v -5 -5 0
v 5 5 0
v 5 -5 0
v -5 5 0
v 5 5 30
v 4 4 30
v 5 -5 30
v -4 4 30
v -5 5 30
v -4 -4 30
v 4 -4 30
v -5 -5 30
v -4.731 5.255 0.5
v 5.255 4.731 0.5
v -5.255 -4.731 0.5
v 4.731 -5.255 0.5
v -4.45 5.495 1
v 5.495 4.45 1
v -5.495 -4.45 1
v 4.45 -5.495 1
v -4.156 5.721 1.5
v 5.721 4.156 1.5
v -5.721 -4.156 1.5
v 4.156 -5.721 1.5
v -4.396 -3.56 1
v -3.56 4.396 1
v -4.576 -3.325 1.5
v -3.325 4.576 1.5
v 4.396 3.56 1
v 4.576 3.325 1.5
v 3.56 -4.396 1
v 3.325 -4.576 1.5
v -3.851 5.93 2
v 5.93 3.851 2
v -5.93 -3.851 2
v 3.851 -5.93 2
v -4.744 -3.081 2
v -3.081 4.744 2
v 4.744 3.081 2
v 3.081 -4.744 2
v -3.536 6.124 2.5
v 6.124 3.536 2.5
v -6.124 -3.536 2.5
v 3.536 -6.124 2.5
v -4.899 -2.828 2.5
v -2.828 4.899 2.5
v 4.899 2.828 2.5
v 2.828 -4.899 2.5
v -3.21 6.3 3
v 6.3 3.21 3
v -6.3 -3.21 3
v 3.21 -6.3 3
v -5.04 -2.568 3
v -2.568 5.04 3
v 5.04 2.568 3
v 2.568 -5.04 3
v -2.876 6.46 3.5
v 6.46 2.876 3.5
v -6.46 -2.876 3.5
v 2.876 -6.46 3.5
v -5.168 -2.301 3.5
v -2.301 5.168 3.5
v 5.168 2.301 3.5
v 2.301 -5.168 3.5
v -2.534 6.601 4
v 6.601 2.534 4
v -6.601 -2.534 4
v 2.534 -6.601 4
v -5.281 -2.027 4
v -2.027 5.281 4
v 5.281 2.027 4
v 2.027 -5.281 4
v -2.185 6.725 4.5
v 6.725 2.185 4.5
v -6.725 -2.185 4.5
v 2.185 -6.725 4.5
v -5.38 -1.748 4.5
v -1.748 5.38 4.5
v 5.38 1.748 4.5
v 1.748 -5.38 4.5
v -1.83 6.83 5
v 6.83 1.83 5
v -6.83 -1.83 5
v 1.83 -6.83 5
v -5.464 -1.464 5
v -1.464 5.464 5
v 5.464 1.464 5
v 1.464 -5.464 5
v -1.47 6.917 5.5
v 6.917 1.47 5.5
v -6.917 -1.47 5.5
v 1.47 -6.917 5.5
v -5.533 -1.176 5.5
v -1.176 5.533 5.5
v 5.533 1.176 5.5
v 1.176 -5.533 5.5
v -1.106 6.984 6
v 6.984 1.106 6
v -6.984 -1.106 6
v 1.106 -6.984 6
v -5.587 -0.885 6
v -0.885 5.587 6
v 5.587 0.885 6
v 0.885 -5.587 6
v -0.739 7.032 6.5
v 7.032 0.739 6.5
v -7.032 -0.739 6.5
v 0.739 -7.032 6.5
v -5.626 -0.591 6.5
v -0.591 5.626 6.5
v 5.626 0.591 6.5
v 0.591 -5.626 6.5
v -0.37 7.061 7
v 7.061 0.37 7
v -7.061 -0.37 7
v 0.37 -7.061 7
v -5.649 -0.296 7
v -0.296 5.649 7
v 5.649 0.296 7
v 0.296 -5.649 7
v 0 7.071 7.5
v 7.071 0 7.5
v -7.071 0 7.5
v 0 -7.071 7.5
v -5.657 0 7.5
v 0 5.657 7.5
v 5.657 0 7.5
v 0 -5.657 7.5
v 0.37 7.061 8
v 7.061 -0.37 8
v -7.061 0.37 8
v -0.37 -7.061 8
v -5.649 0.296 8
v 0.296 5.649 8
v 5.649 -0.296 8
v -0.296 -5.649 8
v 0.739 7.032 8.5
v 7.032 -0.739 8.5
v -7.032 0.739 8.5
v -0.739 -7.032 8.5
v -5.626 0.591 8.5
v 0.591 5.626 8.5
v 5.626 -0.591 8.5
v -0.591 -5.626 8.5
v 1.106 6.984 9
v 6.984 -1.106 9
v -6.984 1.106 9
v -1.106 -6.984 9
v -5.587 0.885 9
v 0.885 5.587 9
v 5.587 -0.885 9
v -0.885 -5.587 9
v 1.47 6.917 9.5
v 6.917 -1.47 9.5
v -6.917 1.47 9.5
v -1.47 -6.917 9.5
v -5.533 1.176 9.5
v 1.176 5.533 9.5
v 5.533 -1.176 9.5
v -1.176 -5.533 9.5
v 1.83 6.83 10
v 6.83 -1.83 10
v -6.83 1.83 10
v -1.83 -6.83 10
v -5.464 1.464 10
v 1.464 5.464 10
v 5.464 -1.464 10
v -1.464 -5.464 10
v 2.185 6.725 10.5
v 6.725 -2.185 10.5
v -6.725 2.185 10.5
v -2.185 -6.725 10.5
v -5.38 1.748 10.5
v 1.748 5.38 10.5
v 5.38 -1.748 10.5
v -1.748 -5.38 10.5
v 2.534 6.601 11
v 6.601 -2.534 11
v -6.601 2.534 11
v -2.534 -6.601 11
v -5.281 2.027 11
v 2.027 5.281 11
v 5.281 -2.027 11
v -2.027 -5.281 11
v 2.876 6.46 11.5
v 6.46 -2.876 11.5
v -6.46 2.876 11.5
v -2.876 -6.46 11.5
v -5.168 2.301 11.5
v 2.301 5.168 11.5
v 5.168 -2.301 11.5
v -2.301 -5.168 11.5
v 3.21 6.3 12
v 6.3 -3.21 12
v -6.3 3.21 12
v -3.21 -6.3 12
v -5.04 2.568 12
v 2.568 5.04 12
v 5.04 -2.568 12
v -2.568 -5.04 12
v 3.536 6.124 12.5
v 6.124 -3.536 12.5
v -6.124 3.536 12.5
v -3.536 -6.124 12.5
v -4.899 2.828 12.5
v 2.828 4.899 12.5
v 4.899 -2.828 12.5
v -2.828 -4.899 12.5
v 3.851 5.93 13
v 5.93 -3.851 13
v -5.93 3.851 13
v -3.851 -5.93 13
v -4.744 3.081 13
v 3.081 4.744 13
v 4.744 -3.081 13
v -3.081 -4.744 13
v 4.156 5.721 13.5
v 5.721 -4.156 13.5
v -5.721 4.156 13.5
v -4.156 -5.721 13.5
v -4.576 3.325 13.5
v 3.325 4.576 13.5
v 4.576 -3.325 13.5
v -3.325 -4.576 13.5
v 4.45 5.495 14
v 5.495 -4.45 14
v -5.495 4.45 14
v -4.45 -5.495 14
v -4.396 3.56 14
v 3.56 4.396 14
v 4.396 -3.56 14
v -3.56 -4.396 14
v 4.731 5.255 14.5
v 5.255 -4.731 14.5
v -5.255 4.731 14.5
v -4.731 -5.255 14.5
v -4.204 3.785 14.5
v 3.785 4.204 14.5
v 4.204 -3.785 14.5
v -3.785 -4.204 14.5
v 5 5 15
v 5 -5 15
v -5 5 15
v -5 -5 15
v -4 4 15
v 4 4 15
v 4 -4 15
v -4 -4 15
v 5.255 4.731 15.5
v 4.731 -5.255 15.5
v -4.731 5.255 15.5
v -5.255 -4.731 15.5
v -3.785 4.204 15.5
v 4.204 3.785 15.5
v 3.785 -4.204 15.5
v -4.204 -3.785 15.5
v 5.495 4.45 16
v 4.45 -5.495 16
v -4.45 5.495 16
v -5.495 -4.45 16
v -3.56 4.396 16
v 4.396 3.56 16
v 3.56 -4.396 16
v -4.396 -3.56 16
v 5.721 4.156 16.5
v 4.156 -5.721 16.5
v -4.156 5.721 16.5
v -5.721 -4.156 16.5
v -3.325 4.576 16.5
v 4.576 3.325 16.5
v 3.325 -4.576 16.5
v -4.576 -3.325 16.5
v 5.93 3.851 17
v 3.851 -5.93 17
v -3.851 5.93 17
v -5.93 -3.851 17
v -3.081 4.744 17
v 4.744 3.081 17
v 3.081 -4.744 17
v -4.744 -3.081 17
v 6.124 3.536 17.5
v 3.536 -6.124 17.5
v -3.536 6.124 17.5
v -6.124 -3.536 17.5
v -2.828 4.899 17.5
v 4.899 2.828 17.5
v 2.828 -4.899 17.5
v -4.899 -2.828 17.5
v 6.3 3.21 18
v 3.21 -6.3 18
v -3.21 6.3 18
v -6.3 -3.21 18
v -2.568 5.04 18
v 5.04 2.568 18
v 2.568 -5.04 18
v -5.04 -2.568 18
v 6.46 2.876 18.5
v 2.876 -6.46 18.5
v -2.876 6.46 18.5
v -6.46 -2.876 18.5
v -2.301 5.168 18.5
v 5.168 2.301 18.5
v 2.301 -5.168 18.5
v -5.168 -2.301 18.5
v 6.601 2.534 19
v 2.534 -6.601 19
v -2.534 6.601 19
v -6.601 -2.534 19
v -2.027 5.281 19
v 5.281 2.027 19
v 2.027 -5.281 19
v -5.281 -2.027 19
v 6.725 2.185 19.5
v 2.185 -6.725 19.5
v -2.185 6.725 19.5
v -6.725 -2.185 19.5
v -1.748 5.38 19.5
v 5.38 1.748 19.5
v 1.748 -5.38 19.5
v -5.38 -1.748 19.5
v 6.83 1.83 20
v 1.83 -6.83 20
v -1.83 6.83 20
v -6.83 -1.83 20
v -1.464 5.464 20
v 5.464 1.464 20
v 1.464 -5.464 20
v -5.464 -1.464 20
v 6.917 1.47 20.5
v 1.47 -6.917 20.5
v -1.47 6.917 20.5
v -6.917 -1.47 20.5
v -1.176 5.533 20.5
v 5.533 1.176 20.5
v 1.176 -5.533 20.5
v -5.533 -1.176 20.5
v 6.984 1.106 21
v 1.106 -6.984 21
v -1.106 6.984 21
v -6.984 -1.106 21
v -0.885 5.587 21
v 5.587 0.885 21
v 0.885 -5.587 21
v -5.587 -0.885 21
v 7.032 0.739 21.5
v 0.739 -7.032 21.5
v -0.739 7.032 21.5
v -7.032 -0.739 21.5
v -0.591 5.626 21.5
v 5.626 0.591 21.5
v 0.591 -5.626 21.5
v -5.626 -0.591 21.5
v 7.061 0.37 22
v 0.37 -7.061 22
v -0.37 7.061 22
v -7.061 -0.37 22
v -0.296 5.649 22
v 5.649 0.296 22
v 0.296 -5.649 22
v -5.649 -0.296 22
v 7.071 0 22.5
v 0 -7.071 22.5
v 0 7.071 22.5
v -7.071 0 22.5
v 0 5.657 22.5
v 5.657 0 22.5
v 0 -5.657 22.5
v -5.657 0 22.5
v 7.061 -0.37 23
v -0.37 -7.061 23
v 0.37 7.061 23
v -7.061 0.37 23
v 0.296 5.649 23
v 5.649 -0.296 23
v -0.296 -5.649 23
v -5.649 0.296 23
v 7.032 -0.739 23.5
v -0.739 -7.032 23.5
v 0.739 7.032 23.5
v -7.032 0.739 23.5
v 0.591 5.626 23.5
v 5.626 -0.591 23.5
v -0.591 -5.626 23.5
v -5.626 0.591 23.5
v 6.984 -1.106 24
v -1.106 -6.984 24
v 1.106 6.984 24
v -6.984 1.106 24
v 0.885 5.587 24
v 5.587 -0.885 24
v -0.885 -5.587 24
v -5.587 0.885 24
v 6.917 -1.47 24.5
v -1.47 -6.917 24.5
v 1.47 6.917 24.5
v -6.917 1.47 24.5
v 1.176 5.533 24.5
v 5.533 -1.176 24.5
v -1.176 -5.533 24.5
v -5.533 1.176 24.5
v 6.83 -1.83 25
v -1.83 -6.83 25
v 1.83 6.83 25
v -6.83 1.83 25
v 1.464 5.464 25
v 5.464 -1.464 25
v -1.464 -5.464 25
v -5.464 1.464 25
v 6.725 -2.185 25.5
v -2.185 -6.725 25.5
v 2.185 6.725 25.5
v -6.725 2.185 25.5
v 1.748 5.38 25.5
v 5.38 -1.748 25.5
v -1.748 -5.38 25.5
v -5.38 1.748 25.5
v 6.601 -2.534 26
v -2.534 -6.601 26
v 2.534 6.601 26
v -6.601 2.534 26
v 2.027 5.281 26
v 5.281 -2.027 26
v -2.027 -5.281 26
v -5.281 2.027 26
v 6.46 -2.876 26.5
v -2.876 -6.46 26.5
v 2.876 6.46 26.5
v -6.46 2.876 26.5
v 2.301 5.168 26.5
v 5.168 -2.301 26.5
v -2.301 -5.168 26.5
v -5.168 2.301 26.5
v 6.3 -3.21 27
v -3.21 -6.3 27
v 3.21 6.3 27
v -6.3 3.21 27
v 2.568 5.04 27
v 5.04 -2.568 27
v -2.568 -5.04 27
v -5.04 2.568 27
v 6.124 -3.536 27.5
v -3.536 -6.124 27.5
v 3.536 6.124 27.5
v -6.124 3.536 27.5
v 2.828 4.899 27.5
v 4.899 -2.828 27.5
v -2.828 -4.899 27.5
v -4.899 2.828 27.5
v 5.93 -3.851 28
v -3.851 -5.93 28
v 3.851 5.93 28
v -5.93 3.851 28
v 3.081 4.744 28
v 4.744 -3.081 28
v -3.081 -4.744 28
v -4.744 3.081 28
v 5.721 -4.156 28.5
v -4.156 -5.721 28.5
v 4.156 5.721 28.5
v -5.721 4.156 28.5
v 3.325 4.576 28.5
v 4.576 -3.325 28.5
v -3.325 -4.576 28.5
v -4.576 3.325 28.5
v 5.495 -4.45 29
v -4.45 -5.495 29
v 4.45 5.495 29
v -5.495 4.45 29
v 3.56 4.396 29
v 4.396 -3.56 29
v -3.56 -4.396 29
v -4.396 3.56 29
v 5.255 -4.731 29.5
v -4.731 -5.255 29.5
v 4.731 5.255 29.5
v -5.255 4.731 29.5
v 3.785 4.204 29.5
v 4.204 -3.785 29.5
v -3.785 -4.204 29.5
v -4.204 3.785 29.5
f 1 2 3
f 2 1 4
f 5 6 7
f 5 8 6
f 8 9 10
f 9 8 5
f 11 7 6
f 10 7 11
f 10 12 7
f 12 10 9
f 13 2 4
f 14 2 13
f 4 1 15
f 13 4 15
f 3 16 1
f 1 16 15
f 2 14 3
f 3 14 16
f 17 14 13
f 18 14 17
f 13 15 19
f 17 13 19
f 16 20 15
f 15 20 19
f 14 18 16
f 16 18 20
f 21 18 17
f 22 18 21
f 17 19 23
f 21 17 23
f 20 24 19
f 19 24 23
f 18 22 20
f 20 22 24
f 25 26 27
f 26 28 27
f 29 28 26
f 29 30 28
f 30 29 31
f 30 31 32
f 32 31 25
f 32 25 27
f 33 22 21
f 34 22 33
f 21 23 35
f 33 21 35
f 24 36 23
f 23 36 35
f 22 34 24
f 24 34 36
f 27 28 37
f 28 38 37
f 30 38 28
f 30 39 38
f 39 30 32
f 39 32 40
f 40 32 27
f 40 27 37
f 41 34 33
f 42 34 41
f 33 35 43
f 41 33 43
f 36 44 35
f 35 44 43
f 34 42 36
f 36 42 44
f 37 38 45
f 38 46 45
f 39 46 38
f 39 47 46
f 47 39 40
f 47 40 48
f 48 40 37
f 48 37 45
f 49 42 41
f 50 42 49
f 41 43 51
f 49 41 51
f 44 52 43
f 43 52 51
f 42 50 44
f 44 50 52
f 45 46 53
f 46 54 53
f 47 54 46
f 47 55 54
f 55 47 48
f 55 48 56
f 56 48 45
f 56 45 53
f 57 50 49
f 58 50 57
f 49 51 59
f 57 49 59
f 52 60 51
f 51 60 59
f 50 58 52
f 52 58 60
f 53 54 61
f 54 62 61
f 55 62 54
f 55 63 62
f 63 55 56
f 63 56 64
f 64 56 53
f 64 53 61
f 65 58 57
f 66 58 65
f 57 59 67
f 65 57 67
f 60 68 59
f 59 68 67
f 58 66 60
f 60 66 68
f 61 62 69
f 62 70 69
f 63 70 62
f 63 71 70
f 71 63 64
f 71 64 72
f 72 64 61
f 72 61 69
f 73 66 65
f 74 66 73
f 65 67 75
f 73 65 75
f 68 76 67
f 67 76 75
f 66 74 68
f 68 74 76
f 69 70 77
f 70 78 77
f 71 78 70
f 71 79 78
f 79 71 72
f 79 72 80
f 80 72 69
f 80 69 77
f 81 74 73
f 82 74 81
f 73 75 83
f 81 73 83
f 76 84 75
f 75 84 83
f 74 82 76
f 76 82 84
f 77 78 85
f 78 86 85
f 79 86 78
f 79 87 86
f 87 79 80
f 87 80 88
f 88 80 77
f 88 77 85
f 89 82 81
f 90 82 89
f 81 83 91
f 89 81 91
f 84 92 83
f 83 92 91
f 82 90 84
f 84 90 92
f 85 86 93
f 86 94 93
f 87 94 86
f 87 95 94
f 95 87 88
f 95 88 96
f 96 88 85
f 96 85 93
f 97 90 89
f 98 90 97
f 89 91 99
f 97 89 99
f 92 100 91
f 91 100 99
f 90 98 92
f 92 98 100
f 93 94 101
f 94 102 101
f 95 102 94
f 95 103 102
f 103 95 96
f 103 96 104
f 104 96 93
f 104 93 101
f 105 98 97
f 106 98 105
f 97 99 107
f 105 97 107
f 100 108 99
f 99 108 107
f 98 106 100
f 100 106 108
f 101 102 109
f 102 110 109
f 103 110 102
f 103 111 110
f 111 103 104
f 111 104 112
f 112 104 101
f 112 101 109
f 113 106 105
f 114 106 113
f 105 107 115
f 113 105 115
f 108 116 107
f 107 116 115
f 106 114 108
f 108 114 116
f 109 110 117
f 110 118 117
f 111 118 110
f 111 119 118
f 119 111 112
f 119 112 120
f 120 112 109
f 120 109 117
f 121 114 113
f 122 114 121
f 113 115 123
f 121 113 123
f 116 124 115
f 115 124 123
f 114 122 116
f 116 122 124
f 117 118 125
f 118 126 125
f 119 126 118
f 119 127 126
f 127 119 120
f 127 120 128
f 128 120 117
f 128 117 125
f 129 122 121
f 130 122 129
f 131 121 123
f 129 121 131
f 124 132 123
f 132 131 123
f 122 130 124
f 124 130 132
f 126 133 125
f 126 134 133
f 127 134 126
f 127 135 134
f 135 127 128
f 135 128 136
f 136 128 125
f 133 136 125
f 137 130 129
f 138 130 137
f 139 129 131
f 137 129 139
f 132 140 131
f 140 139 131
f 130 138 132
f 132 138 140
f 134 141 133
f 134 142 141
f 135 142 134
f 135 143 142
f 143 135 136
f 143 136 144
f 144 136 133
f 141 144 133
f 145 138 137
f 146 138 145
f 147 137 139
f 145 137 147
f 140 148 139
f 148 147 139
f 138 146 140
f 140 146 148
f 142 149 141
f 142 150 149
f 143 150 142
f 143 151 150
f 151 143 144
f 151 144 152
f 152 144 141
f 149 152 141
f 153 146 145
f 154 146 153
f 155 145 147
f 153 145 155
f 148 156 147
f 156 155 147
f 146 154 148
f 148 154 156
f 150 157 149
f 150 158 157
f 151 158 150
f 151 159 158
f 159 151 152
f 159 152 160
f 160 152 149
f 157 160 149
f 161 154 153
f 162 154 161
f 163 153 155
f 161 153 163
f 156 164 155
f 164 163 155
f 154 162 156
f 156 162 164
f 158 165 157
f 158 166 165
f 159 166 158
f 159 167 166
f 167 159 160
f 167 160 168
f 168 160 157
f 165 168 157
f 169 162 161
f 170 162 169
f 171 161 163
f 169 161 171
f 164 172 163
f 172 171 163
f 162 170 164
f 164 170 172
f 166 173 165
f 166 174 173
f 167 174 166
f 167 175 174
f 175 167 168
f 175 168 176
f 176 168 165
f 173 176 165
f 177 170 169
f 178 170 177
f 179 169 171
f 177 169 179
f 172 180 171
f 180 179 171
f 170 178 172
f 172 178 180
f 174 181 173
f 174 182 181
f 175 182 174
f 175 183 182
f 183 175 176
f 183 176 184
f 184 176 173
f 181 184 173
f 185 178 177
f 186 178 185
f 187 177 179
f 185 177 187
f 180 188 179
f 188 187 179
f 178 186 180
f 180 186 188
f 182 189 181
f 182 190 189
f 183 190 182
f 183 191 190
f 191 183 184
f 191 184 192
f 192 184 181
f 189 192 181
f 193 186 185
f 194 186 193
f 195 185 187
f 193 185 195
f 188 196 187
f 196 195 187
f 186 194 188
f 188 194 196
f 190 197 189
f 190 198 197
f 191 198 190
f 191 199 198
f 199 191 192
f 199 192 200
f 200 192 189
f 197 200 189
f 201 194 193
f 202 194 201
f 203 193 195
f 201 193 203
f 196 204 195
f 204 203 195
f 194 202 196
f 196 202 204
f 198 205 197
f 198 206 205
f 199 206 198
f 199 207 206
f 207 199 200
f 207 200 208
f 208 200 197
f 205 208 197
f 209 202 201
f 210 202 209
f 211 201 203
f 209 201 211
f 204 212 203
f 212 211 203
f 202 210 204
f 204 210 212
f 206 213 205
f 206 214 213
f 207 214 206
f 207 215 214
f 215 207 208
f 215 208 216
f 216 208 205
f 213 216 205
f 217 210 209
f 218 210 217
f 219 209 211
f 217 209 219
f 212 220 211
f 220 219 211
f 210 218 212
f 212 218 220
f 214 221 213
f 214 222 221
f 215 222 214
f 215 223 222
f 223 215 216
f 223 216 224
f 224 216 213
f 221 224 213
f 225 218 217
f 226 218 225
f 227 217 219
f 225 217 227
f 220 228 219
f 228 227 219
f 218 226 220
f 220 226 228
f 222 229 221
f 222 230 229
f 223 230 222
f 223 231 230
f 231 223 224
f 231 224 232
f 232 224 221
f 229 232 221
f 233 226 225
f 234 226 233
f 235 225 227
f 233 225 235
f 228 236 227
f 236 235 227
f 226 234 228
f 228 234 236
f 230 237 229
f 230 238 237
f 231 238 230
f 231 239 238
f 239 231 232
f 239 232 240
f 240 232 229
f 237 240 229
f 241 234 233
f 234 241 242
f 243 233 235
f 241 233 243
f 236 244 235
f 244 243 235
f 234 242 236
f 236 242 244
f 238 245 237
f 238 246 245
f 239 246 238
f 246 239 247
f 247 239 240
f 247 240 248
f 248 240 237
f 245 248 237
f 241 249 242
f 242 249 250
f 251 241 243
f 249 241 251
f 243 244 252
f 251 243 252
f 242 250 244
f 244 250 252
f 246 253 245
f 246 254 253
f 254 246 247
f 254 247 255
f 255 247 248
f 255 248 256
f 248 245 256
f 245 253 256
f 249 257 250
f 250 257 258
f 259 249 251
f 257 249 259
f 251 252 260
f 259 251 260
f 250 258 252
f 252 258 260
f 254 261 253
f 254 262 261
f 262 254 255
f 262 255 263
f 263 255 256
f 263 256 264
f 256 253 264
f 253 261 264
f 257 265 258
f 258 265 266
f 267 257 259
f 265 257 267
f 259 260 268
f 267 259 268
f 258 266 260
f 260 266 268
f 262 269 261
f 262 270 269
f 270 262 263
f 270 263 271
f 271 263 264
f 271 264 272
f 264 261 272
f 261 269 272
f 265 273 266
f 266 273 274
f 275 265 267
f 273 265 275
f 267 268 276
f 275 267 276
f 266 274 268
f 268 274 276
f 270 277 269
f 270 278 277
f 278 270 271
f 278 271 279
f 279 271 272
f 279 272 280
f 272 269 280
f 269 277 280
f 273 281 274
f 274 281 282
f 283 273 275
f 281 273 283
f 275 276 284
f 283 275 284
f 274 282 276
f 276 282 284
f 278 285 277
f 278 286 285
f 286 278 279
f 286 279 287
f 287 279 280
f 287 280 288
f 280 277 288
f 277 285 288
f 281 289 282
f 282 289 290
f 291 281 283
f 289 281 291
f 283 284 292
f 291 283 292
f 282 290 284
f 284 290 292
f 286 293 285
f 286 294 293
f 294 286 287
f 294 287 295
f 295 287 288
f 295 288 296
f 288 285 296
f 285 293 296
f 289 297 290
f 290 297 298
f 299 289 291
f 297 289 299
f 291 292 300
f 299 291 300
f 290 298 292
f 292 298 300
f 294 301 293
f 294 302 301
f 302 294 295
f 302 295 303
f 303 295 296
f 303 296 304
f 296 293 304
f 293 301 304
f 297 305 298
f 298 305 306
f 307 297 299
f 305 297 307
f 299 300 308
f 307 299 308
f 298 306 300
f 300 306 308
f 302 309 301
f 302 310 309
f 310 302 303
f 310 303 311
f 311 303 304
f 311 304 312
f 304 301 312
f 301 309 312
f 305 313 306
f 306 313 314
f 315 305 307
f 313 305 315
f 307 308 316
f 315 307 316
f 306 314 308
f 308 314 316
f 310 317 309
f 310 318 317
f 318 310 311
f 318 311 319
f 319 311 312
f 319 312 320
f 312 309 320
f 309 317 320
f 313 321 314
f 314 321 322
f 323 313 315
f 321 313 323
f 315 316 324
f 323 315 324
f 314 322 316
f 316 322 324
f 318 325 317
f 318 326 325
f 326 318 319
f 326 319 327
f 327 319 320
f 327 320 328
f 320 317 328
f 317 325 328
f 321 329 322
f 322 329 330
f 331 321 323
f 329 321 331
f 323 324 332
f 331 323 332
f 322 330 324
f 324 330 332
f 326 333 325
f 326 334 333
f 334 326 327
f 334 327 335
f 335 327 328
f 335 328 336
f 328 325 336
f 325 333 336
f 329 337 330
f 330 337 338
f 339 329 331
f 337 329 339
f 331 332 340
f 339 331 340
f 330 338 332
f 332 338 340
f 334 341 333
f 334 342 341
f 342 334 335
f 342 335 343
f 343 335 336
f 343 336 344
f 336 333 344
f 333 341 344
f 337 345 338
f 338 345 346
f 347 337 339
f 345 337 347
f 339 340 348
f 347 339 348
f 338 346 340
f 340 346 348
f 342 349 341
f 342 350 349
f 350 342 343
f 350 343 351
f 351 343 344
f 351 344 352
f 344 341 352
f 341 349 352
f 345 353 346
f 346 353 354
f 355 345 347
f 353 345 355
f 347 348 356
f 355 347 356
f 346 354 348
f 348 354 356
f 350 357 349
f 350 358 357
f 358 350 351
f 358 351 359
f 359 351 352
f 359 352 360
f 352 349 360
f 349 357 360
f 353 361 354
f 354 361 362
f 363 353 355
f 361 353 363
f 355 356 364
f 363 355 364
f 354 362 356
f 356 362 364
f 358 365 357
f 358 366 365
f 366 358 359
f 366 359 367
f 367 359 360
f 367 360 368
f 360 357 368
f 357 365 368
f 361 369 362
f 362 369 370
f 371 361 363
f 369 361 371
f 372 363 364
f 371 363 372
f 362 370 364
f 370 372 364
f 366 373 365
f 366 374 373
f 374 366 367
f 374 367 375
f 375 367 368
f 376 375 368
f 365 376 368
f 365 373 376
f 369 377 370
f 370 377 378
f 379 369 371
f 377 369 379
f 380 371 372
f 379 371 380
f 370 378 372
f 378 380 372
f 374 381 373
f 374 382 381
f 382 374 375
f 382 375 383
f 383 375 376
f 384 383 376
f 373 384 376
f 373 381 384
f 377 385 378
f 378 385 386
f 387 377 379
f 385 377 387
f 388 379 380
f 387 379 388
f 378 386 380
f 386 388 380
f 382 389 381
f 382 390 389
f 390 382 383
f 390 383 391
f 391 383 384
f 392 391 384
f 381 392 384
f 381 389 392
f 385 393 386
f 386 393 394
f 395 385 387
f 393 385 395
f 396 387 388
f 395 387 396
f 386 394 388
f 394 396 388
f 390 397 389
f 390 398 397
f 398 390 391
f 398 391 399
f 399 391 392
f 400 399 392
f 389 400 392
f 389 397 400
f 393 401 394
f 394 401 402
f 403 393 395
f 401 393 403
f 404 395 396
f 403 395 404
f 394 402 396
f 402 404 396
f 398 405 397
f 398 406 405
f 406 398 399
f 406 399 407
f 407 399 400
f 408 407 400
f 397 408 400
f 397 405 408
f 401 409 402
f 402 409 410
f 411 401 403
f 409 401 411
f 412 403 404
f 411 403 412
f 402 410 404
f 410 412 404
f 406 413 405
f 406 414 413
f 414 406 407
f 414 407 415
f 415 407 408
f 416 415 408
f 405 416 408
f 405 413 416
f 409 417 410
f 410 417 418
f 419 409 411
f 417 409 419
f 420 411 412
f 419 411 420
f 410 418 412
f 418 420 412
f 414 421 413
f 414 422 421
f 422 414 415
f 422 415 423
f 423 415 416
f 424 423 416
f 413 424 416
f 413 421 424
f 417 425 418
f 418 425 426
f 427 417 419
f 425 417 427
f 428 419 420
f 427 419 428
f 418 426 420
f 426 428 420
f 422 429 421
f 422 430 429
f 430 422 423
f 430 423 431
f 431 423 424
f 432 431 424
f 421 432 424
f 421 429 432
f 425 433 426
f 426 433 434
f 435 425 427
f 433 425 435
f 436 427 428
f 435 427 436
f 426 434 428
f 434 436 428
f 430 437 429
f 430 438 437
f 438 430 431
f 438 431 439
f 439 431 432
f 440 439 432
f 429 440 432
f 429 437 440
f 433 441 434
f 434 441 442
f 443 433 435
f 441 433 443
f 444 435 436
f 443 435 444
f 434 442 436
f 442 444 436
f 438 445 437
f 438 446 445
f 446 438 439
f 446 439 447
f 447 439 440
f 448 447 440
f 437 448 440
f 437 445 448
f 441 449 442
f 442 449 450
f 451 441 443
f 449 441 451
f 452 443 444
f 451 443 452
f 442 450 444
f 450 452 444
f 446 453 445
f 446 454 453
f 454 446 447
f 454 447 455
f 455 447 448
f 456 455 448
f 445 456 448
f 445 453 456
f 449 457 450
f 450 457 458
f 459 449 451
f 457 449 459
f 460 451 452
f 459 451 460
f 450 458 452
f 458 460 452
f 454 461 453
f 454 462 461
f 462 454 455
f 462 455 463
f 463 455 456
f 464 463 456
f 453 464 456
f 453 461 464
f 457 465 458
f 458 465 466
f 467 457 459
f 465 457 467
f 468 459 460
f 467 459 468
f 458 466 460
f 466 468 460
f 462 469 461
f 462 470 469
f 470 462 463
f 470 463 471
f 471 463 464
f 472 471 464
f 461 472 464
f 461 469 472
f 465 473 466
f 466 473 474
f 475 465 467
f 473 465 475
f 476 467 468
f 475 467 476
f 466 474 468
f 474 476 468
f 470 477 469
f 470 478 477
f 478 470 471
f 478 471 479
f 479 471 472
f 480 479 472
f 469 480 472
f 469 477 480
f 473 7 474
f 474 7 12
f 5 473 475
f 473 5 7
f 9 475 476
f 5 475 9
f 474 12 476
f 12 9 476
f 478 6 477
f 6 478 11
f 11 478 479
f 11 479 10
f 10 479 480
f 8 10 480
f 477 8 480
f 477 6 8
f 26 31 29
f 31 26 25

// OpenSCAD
height = 30;
twist = 180;
floor = 1;

$fn=120;
linear_extrude(height = height, twist = twist) {
    translate([-5,-5]) {
        difference() {
            square(10);
            translate([1, 1]) {
                square(8);
            }
        }
    }
}

linear_extrude(height = floor, twist = floor/height * twist) {
    translate([-5, -5]) {
        square(10);
    }
}
